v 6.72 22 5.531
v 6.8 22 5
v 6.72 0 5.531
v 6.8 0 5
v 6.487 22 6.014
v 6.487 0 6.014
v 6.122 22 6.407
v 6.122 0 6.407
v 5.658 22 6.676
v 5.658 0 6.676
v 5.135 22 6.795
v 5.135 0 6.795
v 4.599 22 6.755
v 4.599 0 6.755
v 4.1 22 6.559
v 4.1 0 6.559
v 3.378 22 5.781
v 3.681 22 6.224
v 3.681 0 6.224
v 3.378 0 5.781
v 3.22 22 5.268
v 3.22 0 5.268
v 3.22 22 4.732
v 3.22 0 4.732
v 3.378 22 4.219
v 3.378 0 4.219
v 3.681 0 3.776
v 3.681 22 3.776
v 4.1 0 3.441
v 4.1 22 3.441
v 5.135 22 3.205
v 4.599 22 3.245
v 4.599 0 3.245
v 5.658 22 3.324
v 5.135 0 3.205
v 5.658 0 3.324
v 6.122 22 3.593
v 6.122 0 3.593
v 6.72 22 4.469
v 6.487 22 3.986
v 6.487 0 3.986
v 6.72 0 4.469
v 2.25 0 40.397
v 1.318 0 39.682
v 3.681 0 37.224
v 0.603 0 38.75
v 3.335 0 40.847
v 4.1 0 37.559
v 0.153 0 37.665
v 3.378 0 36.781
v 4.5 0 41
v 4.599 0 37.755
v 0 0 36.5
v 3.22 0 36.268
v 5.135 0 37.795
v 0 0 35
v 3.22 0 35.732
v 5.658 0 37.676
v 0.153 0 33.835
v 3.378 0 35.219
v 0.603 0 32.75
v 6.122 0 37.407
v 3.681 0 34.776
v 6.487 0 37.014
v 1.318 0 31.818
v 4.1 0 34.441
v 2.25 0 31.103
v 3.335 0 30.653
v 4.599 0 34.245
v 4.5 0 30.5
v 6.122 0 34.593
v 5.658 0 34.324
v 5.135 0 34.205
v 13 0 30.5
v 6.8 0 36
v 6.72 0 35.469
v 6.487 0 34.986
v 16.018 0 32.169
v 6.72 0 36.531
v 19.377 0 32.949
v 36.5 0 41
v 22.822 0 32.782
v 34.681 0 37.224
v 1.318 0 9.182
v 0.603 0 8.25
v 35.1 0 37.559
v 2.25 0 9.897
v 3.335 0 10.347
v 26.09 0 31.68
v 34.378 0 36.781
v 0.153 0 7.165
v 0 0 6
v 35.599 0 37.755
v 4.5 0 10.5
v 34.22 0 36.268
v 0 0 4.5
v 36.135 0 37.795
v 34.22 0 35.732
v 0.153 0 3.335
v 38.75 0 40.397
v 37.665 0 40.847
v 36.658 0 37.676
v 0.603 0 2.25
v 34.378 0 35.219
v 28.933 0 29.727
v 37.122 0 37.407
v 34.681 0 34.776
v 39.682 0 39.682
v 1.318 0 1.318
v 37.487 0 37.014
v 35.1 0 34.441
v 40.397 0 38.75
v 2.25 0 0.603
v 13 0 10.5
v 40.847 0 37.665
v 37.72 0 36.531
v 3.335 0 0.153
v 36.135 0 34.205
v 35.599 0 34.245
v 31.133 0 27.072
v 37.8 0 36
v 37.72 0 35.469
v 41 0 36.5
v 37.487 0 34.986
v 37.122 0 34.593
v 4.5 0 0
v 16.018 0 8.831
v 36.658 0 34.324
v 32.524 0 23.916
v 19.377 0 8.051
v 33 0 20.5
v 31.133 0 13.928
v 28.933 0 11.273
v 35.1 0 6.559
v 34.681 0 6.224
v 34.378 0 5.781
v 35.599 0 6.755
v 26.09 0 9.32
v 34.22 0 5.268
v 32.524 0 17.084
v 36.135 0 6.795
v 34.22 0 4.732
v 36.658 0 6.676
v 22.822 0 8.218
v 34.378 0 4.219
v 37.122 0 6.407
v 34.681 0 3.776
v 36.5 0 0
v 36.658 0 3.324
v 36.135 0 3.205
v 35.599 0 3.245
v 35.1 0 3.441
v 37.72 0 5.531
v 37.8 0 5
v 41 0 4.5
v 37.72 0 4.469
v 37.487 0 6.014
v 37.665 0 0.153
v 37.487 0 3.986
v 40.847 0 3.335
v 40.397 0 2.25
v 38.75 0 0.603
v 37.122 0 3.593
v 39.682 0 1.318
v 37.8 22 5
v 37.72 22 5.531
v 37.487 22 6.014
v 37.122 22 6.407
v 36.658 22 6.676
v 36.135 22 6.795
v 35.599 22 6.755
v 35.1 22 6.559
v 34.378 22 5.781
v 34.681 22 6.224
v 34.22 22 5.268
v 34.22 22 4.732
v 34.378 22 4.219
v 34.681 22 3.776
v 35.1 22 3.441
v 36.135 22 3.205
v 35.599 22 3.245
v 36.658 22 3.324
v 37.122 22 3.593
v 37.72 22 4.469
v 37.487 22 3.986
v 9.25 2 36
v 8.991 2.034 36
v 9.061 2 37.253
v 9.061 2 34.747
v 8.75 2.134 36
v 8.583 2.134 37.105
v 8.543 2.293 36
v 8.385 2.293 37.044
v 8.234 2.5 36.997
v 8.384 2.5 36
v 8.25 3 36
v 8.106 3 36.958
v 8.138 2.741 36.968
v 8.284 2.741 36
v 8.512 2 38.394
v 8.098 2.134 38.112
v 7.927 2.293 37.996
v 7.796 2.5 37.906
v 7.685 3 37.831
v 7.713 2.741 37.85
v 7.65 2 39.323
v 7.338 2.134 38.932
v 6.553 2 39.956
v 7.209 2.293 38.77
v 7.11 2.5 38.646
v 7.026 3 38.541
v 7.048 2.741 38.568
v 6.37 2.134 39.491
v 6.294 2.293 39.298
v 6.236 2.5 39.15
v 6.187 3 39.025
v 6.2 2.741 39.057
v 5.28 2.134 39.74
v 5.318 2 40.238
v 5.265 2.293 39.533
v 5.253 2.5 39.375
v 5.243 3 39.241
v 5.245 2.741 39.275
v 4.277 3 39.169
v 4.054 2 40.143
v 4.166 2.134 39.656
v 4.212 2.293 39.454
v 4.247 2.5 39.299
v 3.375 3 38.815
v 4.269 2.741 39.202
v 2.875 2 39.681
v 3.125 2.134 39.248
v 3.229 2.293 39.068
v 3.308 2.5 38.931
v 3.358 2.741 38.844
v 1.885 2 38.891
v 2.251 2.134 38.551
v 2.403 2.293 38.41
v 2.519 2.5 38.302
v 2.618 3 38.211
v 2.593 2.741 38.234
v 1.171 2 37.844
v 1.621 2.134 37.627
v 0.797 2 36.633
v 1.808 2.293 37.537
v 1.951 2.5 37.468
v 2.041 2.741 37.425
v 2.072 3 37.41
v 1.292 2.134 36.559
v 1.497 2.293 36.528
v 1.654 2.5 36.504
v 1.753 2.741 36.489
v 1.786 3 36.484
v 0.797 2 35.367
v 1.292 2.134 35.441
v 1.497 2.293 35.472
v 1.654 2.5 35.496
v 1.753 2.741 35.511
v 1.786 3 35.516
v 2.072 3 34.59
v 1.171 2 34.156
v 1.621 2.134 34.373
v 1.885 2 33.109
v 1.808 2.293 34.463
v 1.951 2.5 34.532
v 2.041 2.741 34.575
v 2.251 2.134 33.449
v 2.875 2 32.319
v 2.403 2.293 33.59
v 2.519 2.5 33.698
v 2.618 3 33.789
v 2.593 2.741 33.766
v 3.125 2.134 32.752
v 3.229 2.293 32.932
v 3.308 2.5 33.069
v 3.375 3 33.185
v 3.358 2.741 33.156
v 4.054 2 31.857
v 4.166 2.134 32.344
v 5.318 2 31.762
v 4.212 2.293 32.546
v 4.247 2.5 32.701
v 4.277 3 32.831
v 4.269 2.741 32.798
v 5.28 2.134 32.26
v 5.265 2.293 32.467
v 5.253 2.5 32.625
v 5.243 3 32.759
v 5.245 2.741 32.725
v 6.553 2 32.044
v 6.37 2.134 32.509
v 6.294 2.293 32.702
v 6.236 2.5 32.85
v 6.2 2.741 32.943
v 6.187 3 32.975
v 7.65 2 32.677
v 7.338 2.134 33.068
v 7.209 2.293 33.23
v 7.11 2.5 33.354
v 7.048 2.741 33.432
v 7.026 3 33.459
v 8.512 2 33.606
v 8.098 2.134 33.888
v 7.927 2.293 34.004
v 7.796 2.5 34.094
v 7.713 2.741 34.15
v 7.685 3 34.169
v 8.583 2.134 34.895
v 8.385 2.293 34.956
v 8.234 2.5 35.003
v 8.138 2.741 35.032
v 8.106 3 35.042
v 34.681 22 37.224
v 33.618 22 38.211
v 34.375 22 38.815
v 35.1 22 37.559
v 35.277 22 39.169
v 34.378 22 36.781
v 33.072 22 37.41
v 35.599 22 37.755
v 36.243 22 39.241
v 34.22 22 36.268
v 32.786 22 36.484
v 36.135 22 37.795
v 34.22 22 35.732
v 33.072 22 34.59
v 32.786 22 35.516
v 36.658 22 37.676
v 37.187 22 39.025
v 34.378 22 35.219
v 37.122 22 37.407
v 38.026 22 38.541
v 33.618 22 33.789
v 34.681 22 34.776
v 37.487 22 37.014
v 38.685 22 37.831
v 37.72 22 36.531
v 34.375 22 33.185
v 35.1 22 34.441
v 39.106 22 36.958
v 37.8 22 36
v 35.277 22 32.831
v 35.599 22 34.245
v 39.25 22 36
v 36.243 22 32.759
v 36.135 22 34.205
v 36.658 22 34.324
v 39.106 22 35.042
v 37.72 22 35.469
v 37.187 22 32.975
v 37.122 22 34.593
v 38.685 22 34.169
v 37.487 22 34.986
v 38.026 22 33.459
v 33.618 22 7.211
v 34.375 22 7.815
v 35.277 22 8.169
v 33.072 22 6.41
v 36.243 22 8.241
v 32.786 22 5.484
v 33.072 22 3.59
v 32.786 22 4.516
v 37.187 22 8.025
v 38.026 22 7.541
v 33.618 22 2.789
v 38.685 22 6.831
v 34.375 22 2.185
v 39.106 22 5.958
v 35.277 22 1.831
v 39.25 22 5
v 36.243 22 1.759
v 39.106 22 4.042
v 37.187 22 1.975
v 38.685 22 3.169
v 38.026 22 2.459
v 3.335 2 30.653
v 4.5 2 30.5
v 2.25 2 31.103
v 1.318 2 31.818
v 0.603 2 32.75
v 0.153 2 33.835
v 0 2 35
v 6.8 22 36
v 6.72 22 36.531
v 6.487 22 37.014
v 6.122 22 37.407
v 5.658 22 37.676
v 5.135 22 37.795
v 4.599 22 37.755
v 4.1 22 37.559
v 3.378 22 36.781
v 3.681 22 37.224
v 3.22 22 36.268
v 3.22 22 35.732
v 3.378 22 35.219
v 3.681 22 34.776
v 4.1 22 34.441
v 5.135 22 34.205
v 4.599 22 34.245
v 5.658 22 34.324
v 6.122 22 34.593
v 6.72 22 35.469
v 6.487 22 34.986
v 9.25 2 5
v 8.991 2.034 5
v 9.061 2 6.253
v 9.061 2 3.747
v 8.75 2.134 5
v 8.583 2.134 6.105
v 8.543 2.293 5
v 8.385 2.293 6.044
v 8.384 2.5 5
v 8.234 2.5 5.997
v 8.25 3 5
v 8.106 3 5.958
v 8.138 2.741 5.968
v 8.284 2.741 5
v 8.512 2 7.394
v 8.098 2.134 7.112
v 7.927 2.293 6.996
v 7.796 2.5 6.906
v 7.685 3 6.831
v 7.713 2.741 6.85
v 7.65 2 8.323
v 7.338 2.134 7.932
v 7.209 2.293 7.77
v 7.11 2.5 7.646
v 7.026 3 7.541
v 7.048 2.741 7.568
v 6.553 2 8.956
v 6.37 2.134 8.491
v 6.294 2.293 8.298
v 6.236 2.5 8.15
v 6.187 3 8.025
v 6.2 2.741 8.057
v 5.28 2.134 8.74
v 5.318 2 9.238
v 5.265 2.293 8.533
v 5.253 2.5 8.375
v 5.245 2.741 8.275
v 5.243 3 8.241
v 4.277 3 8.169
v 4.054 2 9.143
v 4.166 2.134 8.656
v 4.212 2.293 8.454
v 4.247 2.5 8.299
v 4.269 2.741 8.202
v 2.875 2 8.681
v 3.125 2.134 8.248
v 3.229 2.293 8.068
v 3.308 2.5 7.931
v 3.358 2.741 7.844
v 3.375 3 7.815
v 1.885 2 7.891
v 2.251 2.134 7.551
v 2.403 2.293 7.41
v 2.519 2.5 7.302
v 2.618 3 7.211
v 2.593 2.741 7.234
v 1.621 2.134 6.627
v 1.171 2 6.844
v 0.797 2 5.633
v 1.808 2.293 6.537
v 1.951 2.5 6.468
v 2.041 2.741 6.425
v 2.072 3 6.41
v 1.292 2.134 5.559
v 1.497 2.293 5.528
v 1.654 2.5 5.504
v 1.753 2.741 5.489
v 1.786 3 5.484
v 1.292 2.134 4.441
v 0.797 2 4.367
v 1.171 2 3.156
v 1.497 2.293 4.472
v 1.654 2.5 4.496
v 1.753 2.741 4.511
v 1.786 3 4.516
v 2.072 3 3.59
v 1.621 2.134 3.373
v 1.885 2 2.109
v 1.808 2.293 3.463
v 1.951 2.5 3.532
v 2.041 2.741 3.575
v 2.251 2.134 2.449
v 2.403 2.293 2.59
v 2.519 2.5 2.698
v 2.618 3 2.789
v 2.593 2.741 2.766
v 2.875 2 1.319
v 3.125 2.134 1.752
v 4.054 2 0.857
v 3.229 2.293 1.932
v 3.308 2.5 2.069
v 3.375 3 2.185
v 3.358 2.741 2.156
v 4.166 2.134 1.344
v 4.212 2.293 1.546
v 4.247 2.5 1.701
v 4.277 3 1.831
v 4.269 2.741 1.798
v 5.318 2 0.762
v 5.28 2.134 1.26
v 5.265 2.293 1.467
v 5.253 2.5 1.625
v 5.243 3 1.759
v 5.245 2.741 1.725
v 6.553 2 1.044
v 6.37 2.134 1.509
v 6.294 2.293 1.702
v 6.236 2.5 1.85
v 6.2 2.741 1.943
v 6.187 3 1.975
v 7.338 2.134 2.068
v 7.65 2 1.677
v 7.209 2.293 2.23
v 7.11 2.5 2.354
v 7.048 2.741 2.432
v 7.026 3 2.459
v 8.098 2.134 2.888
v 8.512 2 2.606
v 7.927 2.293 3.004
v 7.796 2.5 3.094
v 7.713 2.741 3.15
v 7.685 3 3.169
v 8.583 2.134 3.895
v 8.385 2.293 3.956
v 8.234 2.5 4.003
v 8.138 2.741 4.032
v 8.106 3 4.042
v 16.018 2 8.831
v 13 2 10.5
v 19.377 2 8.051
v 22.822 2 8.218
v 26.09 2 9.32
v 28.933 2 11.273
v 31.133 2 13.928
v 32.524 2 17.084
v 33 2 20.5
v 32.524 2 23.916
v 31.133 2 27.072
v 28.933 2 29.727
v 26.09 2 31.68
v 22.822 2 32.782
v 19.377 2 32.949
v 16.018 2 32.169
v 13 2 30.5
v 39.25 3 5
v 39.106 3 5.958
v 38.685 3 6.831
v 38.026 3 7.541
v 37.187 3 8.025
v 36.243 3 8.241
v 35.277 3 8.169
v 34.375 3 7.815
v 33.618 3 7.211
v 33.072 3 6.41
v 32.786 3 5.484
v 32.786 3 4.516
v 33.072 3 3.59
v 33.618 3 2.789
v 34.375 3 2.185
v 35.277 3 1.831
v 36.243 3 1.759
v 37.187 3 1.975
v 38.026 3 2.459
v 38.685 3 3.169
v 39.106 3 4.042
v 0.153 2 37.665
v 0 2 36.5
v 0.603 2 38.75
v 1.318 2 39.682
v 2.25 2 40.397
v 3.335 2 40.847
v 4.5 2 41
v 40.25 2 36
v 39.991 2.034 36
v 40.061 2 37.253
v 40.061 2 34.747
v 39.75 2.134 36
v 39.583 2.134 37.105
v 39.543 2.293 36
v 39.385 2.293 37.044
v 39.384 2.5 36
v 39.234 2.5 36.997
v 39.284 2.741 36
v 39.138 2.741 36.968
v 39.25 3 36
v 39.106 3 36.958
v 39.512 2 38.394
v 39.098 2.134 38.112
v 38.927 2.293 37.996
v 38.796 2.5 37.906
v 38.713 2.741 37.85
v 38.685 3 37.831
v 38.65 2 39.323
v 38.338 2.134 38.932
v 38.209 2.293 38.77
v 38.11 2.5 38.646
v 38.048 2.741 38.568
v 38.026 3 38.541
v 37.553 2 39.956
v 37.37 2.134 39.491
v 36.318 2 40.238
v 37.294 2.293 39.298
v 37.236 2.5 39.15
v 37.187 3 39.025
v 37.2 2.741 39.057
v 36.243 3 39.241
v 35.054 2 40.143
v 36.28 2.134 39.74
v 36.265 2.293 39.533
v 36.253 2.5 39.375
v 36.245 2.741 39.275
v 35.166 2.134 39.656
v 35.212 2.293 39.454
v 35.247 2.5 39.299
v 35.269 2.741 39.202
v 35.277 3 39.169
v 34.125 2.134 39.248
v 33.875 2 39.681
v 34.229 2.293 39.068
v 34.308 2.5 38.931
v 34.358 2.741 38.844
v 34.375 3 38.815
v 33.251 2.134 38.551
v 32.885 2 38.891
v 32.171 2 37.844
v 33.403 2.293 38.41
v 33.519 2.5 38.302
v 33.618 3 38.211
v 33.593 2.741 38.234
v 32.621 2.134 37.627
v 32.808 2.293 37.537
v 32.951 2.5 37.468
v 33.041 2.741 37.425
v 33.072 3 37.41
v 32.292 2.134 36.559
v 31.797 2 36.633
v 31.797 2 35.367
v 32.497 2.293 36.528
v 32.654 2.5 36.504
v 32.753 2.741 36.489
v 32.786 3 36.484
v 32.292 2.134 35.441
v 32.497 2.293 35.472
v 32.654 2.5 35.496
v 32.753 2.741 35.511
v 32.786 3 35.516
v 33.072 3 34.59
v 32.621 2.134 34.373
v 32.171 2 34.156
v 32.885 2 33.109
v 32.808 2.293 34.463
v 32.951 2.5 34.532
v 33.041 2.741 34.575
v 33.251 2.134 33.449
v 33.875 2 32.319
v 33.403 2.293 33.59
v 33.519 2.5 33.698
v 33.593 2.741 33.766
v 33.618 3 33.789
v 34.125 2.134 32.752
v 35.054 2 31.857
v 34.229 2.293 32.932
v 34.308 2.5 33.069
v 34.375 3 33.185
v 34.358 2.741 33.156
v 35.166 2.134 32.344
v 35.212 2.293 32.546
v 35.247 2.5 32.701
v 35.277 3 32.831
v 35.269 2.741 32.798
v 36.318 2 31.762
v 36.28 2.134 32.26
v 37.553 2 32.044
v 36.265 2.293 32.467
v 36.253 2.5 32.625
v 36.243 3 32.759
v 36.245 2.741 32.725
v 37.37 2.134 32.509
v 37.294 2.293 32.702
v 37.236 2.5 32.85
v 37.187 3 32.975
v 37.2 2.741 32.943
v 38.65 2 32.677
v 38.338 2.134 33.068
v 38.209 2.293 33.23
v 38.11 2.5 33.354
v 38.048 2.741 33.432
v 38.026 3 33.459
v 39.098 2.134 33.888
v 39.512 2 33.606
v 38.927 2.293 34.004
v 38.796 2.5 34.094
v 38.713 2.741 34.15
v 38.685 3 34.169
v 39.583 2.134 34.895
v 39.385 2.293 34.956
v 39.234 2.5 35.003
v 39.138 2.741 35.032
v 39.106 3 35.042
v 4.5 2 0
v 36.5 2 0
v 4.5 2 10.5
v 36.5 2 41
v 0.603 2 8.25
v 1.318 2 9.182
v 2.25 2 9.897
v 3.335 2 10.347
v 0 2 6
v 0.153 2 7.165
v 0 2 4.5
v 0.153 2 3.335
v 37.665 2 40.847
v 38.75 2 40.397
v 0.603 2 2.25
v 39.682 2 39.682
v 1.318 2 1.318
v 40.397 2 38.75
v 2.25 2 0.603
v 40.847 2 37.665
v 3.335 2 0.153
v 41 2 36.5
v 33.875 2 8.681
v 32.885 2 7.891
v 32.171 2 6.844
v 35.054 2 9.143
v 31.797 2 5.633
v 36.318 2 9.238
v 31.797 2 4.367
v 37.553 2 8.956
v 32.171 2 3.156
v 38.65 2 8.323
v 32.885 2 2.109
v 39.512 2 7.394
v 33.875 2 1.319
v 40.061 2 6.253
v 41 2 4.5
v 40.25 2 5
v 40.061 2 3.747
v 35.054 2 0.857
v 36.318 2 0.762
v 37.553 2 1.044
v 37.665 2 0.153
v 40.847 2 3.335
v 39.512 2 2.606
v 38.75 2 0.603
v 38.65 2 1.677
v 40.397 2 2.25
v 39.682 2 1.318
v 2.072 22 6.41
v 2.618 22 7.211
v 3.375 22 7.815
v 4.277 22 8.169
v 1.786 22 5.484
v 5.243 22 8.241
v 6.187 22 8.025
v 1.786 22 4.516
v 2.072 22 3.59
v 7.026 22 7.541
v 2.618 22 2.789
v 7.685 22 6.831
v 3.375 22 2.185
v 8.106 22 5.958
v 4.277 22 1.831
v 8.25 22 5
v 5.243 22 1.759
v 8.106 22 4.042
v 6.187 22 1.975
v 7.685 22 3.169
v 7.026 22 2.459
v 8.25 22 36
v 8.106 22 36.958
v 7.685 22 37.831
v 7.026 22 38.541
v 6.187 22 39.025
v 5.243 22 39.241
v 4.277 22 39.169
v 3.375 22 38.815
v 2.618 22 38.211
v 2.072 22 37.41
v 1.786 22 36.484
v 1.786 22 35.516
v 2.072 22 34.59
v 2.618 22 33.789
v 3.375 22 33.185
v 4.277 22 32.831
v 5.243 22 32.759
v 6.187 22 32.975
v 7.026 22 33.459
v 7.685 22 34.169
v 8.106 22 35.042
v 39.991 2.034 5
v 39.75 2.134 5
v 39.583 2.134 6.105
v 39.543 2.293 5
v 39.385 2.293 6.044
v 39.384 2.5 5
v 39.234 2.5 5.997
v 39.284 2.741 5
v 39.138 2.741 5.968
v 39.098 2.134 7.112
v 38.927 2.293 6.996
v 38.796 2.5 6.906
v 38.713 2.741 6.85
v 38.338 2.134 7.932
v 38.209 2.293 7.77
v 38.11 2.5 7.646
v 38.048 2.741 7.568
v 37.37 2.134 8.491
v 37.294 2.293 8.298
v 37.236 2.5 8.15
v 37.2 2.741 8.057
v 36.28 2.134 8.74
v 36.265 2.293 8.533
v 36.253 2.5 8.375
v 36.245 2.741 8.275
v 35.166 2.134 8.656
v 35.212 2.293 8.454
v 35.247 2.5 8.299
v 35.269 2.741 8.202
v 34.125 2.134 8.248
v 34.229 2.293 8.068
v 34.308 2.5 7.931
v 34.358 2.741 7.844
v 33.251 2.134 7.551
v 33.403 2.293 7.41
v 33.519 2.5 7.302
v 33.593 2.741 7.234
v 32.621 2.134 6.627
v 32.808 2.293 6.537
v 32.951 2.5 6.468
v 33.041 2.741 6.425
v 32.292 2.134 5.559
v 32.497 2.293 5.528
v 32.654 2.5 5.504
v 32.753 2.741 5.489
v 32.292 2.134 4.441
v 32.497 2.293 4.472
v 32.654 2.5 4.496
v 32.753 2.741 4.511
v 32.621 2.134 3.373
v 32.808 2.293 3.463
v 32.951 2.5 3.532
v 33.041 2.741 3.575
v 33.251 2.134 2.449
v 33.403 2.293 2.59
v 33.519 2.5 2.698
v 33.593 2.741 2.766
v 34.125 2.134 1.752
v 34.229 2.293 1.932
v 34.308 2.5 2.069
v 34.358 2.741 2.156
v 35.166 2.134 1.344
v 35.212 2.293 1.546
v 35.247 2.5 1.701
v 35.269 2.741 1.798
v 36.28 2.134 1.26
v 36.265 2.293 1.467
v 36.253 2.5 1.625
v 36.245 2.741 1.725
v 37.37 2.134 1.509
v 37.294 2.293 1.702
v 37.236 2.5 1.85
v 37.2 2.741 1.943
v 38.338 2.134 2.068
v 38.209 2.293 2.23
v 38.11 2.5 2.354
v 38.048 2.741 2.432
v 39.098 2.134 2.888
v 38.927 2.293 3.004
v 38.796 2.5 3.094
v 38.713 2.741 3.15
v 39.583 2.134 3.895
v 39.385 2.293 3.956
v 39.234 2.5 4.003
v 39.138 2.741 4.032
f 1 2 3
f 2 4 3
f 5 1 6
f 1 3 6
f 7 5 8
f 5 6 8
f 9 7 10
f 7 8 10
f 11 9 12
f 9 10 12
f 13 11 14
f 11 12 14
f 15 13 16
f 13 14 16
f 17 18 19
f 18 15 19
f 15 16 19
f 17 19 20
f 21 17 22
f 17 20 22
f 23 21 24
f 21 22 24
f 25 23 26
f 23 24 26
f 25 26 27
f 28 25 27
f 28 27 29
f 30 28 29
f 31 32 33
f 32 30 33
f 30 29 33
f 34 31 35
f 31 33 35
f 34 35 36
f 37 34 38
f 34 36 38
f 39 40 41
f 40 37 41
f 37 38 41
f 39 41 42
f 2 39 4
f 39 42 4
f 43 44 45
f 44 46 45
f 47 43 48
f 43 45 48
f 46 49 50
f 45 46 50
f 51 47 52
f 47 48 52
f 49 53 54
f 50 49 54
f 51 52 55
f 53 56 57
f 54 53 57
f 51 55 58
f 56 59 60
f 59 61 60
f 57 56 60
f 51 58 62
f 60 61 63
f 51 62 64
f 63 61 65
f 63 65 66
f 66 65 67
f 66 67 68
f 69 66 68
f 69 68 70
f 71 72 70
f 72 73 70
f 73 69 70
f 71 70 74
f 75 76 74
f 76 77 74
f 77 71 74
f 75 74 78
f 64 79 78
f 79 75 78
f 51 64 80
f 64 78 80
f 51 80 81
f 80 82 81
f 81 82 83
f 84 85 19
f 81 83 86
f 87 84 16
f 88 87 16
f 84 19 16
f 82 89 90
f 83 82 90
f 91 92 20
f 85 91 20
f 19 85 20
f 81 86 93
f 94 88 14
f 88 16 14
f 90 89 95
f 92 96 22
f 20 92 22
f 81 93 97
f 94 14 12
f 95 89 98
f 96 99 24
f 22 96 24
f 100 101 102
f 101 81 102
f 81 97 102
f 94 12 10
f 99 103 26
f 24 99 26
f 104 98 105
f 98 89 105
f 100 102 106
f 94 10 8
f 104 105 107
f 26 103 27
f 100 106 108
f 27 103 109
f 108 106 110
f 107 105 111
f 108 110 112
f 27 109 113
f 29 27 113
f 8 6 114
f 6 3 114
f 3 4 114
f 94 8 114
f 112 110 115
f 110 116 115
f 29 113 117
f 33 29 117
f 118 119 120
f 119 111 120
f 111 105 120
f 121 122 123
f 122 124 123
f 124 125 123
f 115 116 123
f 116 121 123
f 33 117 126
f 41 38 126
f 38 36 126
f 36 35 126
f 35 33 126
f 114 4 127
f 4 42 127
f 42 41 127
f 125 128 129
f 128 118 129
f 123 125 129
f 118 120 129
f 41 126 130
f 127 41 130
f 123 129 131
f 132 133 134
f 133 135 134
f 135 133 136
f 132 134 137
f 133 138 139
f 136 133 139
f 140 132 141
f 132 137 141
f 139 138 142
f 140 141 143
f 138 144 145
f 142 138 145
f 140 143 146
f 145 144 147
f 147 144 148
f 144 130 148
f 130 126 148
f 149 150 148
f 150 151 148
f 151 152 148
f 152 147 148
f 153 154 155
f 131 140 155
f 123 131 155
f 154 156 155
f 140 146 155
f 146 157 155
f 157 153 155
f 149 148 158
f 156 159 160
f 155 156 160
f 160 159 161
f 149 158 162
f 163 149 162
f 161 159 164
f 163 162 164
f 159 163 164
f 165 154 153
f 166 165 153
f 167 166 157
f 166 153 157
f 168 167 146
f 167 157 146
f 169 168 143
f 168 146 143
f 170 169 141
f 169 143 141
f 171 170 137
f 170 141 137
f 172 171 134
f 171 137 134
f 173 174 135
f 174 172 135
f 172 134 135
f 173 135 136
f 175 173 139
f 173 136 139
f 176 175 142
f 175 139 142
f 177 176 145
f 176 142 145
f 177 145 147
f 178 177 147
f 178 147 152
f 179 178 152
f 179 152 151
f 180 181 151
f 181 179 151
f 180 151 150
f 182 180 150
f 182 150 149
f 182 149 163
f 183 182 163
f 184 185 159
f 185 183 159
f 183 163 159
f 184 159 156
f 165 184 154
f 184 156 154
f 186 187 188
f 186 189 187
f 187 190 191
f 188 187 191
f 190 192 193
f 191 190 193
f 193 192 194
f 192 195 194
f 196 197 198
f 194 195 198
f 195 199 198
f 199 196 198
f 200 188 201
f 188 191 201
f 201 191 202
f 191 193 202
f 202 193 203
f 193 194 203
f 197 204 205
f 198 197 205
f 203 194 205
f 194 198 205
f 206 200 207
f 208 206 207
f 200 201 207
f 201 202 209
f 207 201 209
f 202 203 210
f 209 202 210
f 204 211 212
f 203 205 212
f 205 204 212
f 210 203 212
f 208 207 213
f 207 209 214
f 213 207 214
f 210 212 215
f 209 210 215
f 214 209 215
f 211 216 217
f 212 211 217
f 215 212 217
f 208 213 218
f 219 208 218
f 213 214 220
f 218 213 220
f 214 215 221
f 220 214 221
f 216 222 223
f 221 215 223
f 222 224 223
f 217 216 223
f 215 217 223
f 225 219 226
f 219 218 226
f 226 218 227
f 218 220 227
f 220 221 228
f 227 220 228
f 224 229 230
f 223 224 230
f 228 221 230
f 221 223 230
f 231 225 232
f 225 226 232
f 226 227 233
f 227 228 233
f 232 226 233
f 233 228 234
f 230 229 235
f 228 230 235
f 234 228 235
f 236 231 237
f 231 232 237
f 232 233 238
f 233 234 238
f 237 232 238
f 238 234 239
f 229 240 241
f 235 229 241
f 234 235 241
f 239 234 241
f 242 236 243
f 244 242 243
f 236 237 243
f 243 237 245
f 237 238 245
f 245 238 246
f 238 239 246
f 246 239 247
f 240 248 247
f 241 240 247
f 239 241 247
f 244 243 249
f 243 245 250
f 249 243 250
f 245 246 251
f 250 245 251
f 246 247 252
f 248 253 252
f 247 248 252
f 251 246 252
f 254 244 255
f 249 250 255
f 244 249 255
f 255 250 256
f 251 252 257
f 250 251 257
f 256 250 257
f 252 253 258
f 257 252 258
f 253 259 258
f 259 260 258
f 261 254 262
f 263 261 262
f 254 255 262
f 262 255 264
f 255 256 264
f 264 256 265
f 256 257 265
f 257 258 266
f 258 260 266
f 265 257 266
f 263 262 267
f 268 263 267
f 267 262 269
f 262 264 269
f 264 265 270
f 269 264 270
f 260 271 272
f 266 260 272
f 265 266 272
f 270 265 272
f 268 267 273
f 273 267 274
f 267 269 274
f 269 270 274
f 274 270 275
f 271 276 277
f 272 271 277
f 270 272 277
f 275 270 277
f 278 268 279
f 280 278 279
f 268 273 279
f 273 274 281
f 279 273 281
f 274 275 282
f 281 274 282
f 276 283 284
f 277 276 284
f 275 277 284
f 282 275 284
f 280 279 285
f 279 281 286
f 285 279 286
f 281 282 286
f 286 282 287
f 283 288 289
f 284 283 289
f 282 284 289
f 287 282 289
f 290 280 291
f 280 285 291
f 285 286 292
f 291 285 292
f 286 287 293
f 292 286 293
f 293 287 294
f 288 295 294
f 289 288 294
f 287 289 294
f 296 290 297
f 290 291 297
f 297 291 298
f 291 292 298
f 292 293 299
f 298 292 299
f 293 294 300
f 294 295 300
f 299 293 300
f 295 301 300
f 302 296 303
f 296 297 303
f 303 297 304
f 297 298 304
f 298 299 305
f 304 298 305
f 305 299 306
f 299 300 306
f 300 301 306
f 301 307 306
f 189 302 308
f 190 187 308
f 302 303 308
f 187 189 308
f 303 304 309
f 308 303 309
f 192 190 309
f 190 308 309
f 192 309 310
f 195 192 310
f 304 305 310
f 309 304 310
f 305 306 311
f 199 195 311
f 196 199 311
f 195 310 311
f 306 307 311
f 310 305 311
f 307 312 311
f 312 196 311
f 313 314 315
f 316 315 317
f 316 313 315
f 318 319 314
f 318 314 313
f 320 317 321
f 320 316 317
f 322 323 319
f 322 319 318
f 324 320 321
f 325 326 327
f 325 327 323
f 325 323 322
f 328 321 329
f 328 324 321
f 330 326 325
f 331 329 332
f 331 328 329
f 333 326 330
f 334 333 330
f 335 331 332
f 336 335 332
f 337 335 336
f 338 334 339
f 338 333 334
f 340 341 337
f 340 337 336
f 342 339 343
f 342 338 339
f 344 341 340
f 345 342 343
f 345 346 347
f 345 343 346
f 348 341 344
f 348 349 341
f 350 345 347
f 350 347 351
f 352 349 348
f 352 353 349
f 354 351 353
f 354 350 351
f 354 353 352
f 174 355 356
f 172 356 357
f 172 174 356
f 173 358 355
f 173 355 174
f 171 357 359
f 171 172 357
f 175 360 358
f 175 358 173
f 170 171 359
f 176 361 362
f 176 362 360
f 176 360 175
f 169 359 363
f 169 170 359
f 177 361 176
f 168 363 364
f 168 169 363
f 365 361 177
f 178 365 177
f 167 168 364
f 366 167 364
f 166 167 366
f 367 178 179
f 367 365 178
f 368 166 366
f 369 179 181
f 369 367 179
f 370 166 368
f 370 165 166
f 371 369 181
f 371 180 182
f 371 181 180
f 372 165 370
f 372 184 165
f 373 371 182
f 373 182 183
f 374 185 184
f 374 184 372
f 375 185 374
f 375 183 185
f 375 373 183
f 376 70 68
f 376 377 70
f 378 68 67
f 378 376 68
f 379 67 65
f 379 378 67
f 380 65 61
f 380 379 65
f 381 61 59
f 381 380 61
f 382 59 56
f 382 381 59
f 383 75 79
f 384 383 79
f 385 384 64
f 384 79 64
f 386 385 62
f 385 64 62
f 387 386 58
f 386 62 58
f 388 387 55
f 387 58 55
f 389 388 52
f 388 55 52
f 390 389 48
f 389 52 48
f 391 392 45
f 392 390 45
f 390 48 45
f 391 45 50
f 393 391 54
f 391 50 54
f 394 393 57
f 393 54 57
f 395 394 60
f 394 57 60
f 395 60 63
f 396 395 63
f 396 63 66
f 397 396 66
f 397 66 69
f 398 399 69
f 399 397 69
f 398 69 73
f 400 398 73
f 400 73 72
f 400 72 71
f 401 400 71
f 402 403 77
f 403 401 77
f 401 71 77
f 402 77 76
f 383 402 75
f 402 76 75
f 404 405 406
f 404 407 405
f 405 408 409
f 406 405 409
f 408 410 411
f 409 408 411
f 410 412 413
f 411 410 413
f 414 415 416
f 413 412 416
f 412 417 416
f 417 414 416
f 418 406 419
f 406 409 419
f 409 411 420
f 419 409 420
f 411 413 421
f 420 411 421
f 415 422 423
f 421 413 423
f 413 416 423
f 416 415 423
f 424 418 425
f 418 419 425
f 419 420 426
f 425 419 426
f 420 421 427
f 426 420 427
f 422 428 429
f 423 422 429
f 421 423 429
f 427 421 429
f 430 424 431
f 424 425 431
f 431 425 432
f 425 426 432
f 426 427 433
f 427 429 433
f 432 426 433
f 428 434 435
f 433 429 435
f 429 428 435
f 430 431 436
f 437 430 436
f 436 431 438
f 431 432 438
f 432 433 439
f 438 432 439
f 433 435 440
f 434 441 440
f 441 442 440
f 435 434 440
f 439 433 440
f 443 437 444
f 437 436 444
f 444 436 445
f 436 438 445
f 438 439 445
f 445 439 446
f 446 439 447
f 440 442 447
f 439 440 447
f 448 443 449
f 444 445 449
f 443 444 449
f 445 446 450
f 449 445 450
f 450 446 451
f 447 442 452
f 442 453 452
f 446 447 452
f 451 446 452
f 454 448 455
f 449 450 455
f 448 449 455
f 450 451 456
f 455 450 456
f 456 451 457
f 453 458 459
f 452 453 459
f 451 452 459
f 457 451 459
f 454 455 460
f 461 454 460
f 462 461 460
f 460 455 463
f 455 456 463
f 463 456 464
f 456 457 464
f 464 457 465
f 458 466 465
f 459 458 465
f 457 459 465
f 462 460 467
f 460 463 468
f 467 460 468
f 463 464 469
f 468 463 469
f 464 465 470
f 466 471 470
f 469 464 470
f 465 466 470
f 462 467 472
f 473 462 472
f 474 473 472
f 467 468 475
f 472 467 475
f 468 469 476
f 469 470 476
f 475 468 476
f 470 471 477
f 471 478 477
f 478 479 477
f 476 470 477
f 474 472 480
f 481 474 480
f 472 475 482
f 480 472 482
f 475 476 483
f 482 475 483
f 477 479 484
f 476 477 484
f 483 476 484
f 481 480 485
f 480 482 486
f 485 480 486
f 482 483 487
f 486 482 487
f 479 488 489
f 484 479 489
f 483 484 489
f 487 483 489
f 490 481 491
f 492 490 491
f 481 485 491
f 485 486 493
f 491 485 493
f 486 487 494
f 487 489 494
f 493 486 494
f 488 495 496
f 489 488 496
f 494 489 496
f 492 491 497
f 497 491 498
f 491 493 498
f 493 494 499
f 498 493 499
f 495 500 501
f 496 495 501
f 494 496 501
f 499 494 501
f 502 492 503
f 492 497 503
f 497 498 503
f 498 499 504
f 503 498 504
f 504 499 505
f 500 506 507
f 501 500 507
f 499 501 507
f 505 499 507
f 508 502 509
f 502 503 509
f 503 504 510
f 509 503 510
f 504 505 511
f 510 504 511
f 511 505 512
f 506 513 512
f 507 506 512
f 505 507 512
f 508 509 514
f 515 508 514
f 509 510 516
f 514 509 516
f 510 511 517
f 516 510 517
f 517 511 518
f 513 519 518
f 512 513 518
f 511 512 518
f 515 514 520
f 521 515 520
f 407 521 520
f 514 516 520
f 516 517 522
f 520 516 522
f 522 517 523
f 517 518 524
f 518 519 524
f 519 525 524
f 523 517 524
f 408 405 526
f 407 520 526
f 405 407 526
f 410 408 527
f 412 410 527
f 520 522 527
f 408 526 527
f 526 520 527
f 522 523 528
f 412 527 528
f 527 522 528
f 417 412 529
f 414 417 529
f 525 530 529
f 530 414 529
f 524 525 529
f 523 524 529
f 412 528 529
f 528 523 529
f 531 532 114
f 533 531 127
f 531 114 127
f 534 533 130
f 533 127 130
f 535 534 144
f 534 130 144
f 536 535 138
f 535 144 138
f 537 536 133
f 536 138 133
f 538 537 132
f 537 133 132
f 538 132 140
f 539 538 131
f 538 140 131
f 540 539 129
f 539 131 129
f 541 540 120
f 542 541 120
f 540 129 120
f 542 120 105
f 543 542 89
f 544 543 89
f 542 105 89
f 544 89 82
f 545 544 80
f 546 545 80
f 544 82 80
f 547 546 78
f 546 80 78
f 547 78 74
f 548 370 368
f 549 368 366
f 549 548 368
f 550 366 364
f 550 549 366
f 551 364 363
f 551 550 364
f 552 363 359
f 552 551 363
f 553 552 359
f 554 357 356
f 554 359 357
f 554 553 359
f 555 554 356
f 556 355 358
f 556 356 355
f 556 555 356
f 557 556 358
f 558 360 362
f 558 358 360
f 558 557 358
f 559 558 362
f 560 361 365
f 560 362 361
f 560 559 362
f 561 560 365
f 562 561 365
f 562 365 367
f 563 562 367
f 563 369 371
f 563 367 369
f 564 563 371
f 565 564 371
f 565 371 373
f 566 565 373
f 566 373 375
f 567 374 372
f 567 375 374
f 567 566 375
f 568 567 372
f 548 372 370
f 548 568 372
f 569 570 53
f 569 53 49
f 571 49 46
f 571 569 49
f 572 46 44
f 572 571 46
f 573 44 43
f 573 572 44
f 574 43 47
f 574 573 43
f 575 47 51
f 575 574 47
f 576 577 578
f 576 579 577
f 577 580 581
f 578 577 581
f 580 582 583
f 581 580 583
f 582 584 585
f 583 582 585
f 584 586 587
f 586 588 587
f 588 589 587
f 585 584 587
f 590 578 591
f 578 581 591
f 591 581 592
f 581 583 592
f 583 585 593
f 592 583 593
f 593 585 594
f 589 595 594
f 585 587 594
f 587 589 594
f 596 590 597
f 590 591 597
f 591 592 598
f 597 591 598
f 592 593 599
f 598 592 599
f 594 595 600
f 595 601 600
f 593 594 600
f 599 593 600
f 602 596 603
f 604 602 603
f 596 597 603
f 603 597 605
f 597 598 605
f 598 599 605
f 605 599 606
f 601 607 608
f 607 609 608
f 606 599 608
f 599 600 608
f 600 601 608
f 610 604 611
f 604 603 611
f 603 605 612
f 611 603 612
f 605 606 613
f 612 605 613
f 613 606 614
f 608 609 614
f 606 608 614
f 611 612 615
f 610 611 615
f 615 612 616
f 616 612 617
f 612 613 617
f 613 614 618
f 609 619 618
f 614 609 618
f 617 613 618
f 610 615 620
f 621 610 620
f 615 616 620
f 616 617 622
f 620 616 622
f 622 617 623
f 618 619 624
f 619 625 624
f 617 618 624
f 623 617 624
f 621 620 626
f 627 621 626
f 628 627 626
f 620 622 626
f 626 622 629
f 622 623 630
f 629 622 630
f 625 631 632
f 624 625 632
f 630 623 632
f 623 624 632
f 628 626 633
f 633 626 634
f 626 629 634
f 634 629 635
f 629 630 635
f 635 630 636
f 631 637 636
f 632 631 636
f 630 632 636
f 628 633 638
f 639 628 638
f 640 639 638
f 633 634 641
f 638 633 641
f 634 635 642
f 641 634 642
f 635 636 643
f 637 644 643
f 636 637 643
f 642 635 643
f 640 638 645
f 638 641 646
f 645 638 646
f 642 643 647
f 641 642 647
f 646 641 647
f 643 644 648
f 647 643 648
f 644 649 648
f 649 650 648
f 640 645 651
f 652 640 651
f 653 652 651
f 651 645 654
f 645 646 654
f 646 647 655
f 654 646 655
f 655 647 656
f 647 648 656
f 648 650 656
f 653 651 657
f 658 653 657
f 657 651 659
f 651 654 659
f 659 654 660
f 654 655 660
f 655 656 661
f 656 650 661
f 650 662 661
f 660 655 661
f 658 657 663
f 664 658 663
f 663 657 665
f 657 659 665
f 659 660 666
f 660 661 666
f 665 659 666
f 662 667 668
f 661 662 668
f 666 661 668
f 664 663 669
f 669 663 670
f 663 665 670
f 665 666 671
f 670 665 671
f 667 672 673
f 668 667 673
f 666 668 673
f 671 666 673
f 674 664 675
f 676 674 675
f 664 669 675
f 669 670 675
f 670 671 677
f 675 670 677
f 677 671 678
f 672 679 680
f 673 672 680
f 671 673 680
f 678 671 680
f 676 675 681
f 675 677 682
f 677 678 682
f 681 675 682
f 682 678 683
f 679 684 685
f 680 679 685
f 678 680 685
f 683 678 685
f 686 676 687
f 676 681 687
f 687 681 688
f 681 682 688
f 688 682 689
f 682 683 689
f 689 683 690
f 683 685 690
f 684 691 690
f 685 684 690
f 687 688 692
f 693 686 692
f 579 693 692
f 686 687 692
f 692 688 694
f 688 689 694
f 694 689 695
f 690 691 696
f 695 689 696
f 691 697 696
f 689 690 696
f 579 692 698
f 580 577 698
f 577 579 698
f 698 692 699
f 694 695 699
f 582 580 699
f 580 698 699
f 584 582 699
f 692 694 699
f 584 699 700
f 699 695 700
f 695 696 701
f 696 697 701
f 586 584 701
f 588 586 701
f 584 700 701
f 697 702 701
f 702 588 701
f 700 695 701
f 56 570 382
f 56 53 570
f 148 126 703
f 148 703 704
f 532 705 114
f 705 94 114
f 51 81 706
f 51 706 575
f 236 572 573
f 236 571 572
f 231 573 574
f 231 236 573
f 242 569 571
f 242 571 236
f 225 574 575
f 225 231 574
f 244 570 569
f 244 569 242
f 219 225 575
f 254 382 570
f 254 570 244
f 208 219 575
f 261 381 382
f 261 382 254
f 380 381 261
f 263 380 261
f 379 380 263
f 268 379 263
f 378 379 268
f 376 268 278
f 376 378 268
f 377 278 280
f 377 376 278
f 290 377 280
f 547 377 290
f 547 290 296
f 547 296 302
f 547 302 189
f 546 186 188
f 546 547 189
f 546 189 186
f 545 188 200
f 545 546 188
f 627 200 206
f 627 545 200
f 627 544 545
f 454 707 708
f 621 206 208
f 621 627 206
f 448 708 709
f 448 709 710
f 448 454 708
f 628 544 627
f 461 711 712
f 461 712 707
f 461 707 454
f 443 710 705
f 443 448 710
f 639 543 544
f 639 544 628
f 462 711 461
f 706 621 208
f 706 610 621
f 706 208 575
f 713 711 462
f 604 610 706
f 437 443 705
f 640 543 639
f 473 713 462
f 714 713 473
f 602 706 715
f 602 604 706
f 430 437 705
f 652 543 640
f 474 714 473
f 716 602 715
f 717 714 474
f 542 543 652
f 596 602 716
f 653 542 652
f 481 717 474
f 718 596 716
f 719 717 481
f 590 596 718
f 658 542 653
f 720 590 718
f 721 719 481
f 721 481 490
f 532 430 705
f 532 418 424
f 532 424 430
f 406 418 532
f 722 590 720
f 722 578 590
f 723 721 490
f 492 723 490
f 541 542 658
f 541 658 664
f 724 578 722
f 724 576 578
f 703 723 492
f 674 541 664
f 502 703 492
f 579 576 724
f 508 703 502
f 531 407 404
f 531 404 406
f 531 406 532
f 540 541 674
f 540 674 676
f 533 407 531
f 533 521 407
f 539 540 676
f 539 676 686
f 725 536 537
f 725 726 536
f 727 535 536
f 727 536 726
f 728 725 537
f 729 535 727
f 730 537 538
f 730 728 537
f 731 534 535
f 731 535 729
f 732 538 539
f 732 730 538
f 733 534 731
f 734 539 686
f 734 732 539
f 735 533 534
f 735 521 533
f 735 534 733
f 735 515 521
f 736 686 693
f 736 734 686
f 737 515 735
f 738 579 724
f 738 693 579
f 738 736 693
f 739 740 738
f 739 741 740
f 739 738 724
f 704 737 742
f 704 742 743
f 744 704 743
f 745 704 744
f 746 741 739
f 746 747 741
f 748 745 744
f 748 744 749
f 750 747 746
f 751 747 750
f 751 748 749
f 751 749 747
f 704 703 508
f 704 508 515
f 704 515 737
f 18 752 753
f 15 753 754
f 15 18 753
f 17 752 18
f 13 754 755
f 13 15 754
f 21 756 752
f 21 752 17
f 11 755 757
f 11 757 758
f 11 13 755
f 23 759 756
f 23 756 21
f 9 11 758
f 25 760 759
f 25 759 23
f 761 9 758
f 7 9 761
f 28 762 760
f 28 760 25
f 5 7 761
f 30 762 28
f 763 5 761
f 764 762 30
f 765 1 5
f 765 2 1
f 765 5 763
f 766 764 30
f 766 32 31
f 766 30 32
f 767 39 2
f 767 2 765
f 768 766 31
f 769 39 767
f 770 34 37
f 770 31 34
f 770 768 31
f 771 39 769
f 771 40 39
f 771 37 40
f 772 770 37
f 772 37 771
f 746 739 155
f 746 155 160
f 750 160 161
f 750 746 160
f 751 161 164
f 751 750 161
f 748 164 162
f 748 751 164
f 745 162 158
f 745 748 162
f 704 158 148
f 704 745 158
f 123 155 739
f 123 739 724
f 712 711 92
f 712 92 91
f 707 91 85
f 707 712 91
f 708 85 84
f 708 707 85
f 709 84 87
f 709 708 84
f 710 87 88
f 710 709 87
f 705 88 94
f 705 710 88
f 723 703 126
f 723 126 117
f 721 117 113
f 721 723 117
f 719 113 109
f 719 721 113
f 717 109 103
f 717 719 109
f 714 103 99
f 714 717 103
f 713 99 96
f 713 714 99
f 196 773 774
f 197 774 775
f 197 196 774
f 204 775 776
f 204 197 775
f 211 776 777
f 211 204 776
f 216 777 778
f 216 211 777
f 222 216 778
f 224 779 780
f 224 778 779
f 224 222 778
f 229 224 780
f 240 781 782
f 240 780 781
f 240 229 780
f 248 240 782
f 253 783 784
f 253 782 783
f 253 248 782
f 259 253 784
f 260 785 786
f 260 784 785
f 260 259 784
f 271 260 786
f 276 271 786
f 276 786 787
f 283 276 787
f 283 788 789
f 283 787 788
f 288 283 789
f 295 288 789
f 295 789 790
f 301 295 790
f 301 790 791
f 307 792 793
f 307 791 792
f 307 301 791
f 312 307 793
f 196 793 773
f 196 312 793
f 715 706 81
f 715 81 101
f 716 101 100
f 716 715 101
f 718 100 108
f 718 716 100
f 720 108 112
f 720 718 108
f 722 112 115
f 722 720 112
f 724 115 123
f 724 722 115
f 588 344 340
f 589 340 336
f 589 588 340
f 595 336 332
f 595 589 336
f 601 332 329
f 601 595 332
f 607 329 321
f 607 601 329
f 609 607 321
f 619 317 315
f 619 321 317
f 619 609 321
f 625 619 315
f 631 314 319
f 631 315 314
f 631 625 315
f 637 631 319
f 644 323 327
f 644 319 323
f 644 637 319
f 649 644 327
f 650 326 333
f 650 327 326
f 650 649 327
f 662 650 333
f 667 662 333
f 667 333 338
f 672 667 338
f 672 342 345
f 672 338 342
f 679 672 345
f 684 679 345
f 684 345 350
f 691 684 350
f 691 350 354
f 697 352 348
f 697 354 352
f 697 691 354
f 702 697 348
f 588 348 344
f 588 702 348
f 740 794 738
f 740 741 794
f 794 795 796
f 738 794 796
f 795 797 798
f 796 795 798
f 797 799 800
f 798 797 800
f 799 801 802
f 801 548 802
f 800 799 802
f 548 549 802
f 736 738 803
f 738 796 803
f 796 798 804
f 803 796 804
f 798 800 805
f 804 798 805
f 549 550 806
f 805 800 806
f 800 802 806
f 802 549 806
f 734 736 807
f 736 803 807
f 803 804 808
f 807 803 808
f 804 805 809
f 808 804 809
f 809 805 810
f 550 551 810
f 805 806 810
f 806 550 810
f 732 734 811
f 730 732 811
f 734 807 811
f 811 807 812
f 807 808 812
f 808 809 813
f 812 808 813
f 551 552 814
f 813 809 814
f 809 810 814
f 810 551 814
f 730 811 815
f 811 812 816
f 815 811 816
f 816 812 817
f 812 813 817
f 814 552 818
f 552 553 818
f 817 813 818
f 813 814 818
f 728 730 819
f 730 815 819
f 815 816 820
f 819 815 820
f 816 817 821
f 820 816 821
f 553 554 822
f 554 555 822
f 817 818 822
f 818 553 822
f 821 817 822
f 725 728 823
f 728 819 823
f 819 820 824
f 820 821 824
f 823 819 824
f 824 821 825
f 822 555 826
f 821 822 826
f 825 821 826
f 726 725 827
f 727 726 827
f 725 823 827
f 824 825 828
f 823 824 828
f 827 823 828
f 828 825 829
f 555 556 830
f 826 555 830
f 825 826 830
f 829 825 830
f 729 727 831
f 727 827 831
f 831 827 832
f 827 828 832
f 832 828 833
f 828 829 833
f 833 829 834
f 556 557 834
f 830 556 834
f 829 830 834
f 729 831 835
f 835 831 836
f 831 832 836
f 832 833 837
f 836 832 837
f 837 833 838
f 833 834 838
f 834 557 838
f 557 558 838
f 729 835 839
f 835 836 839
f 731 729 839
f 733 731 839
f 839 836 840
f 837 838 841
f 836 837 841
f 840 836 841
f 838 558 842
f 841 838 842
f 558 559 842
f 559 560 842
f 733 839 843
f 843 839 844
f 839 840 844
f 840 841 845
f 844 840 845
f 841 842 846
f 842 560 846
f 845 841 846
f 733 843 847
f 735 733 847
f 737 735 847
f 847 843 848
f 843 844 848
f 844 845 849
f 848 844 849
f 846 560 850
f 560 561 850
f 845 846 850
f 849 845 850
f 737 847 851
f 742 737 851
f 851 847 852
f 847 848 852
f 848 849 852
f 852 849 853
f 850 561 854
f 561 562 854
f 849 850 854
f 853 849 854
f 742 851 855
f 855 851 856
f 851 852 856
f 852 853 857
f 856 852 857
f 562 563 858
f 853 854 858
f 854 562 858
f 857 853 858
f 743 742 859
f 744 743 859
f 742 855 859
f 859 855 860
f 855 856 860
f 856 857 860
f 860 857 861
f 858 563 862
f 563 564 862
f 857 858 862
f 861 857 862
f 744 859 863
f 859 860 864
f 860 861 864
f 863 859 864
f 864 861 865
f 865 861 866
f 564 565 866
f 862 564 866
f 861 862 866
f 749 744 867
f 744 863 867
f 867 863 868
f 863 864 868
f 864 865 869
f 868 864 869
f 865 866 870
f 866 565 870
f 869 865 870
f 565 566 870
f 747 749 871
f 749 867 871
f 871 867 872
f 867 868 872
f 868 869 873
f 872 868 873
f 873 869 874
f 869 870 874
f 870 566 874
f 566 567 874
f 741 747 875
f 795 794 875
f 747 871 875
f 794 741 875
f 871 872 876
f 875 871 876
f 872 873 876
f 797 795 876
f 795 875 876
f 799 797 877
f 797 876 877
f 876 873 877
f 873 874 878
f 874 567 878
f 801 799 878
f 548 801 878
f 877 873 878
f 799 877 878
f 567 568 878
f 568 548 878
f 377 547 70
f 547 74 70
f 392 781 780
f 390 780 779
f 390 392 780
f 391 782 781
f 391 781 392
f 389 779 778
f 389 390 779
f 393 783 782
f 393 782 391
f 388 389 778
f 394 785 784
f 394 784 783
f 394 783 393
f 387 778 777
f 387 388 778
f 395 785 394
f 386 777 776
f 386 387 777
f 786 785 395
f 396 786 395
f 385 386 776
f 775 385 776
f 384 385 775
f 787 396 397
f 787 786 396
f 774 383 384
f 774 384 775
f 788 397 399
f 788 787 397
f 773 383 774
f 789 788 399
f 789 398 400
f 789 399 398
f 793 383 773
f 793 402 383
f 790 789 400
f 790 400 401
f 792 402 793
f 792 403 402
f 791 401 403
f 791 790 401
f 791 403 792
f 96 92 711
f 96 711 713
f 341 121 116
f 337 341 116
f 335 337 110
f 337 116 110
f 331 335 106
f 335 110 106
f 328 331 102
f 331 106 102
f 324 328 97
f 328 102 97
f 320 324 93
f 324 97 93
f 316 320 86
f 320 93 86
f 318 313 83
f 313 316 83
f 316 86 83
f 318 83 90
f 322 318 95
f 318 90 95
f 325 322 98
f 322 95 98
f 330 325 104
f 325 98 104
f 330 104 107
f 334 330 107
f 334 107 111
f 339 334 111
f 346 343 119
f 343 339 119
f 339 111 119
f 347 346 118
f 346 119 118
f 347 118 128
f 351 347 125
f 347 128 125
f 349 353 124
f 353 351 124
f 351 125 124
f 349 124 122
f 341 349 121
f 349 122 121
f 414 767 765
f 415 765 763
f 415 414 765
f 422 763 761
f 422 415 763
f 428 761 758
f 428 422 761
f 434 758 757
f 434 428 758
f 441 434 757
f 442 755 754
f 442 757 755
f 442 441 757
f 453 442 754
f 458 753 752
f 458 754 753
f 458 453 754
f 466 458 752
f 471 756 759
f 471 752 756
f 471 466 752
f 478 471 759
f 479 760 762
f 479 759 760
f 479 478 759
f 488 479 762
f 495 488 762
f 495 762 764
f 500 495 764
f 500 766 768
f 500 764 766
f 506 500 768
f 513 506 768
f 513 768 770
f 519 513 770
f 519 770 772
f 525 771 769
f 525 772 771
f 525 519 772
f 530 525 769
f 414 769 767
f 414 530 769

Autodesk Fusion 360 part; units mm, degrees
sketch "Sketch1" plane through (0, 0, 0) normal (0, 1, 0) x (1, 0, 0)
  line L0 (0, 0) -> (41, 0)
  line L1 (41, 0) -> (41, -41)
  line L2 (41, -41) -> (0, -41)
  line L3 (0, -41) -> (0, 0)
  line L4 (0, -20.5) -> (41, -20.5) construction
  line L5 (20.5, 0) -> (20.5, -41) construction
  circle A0 centre (20.5, -20.5) radius 12.5
  line L6 (36, -36) -> (5, -36) construction
  line L7 (5, -36) -> (5, -5) construction
  line L8 (5, -5) -> (36, -5) construction
  line L9 (36, -5) -> (36, -36) construction
  line L10 (36, -36) -> (5, -5) construction
  line L11 (5, -36) -> (36, -5) construction
  circle A1 centre (5, -36) radius 1.8
  circle A2 centre (36, -36) radius 1.8
  circle A3 centre (36, -5) radius 1.8
  circle A4 centre (5, -5) radius 1.8
  circle A5 centre (5, -36) radius 3.25
  circle A6 centre (36, -36) radius 3.25
  circle A7 centre (36, -5) radius 3.25
  circle A8 centre (5, -5) radius 3.25
  line L12 (0, -10.5) -> (13, -10.5)
  line L13 (13, -30.5) -> (0, -30.5)
  point P0 (20.5, -20.5)
  dimension "d1" = 31
  dimension "d2" = 31
  dimension "d3" = 25
  dimension "d4" = 3.6
  dimension "d5" = 3.6
  dimension "d6" = 3.6
  dimension "d7" = 3.6
  dimension "d8" = 6.5
  dimension "d9" = 6.5
  dimension "d10" = 6.5
  dimension "d11" = 6.5
  dimension "d12" = 41
  dimension "d13" = 10
  dimension "d14" = 10
extrude "Extrude1" add sketch "Sketch1" along normal blind 2 contours L0 L1 L2 L3 A0 L12 L13 | A5 | A6 | A7 | A8
extrude "Extrude2" add sketch "Sketch1" along normal blind 22 contours A5 | A6 | A7 | A8
ref_plane "WorkPlane1" through (20.5, 1, 20.5) normal (0, 0, 1) x (1, 0, 0)
fillet "Fillet1" radius 1 4 edges at (32.9699, 2, 34.8247) (32.9699, 2, 3.8247) (1.9699, 2, 3.8247) (1.9699, 2, 34.8247)
fillet "Fillet2" radius 4.5 6 edges at (41, 1, 0) (41, 1, 41) (0, 1, 0) (0, 1, 41) (0, 1, 10.5) (0, 1, 30.5)
equation "d2 = d1"
equation "d5 = d4"
equation "d6 = d5"
equation "d7 = d4"
equation "d9 = d8"
equation "d10 = d8"
equation "d11 = d8"
equation "d14 = d13"
equation "Hoogte = 22 mm"
equation "d18 = Hoogte"
equation "d20 = ( -41 / 2 ) * 1 mm"
